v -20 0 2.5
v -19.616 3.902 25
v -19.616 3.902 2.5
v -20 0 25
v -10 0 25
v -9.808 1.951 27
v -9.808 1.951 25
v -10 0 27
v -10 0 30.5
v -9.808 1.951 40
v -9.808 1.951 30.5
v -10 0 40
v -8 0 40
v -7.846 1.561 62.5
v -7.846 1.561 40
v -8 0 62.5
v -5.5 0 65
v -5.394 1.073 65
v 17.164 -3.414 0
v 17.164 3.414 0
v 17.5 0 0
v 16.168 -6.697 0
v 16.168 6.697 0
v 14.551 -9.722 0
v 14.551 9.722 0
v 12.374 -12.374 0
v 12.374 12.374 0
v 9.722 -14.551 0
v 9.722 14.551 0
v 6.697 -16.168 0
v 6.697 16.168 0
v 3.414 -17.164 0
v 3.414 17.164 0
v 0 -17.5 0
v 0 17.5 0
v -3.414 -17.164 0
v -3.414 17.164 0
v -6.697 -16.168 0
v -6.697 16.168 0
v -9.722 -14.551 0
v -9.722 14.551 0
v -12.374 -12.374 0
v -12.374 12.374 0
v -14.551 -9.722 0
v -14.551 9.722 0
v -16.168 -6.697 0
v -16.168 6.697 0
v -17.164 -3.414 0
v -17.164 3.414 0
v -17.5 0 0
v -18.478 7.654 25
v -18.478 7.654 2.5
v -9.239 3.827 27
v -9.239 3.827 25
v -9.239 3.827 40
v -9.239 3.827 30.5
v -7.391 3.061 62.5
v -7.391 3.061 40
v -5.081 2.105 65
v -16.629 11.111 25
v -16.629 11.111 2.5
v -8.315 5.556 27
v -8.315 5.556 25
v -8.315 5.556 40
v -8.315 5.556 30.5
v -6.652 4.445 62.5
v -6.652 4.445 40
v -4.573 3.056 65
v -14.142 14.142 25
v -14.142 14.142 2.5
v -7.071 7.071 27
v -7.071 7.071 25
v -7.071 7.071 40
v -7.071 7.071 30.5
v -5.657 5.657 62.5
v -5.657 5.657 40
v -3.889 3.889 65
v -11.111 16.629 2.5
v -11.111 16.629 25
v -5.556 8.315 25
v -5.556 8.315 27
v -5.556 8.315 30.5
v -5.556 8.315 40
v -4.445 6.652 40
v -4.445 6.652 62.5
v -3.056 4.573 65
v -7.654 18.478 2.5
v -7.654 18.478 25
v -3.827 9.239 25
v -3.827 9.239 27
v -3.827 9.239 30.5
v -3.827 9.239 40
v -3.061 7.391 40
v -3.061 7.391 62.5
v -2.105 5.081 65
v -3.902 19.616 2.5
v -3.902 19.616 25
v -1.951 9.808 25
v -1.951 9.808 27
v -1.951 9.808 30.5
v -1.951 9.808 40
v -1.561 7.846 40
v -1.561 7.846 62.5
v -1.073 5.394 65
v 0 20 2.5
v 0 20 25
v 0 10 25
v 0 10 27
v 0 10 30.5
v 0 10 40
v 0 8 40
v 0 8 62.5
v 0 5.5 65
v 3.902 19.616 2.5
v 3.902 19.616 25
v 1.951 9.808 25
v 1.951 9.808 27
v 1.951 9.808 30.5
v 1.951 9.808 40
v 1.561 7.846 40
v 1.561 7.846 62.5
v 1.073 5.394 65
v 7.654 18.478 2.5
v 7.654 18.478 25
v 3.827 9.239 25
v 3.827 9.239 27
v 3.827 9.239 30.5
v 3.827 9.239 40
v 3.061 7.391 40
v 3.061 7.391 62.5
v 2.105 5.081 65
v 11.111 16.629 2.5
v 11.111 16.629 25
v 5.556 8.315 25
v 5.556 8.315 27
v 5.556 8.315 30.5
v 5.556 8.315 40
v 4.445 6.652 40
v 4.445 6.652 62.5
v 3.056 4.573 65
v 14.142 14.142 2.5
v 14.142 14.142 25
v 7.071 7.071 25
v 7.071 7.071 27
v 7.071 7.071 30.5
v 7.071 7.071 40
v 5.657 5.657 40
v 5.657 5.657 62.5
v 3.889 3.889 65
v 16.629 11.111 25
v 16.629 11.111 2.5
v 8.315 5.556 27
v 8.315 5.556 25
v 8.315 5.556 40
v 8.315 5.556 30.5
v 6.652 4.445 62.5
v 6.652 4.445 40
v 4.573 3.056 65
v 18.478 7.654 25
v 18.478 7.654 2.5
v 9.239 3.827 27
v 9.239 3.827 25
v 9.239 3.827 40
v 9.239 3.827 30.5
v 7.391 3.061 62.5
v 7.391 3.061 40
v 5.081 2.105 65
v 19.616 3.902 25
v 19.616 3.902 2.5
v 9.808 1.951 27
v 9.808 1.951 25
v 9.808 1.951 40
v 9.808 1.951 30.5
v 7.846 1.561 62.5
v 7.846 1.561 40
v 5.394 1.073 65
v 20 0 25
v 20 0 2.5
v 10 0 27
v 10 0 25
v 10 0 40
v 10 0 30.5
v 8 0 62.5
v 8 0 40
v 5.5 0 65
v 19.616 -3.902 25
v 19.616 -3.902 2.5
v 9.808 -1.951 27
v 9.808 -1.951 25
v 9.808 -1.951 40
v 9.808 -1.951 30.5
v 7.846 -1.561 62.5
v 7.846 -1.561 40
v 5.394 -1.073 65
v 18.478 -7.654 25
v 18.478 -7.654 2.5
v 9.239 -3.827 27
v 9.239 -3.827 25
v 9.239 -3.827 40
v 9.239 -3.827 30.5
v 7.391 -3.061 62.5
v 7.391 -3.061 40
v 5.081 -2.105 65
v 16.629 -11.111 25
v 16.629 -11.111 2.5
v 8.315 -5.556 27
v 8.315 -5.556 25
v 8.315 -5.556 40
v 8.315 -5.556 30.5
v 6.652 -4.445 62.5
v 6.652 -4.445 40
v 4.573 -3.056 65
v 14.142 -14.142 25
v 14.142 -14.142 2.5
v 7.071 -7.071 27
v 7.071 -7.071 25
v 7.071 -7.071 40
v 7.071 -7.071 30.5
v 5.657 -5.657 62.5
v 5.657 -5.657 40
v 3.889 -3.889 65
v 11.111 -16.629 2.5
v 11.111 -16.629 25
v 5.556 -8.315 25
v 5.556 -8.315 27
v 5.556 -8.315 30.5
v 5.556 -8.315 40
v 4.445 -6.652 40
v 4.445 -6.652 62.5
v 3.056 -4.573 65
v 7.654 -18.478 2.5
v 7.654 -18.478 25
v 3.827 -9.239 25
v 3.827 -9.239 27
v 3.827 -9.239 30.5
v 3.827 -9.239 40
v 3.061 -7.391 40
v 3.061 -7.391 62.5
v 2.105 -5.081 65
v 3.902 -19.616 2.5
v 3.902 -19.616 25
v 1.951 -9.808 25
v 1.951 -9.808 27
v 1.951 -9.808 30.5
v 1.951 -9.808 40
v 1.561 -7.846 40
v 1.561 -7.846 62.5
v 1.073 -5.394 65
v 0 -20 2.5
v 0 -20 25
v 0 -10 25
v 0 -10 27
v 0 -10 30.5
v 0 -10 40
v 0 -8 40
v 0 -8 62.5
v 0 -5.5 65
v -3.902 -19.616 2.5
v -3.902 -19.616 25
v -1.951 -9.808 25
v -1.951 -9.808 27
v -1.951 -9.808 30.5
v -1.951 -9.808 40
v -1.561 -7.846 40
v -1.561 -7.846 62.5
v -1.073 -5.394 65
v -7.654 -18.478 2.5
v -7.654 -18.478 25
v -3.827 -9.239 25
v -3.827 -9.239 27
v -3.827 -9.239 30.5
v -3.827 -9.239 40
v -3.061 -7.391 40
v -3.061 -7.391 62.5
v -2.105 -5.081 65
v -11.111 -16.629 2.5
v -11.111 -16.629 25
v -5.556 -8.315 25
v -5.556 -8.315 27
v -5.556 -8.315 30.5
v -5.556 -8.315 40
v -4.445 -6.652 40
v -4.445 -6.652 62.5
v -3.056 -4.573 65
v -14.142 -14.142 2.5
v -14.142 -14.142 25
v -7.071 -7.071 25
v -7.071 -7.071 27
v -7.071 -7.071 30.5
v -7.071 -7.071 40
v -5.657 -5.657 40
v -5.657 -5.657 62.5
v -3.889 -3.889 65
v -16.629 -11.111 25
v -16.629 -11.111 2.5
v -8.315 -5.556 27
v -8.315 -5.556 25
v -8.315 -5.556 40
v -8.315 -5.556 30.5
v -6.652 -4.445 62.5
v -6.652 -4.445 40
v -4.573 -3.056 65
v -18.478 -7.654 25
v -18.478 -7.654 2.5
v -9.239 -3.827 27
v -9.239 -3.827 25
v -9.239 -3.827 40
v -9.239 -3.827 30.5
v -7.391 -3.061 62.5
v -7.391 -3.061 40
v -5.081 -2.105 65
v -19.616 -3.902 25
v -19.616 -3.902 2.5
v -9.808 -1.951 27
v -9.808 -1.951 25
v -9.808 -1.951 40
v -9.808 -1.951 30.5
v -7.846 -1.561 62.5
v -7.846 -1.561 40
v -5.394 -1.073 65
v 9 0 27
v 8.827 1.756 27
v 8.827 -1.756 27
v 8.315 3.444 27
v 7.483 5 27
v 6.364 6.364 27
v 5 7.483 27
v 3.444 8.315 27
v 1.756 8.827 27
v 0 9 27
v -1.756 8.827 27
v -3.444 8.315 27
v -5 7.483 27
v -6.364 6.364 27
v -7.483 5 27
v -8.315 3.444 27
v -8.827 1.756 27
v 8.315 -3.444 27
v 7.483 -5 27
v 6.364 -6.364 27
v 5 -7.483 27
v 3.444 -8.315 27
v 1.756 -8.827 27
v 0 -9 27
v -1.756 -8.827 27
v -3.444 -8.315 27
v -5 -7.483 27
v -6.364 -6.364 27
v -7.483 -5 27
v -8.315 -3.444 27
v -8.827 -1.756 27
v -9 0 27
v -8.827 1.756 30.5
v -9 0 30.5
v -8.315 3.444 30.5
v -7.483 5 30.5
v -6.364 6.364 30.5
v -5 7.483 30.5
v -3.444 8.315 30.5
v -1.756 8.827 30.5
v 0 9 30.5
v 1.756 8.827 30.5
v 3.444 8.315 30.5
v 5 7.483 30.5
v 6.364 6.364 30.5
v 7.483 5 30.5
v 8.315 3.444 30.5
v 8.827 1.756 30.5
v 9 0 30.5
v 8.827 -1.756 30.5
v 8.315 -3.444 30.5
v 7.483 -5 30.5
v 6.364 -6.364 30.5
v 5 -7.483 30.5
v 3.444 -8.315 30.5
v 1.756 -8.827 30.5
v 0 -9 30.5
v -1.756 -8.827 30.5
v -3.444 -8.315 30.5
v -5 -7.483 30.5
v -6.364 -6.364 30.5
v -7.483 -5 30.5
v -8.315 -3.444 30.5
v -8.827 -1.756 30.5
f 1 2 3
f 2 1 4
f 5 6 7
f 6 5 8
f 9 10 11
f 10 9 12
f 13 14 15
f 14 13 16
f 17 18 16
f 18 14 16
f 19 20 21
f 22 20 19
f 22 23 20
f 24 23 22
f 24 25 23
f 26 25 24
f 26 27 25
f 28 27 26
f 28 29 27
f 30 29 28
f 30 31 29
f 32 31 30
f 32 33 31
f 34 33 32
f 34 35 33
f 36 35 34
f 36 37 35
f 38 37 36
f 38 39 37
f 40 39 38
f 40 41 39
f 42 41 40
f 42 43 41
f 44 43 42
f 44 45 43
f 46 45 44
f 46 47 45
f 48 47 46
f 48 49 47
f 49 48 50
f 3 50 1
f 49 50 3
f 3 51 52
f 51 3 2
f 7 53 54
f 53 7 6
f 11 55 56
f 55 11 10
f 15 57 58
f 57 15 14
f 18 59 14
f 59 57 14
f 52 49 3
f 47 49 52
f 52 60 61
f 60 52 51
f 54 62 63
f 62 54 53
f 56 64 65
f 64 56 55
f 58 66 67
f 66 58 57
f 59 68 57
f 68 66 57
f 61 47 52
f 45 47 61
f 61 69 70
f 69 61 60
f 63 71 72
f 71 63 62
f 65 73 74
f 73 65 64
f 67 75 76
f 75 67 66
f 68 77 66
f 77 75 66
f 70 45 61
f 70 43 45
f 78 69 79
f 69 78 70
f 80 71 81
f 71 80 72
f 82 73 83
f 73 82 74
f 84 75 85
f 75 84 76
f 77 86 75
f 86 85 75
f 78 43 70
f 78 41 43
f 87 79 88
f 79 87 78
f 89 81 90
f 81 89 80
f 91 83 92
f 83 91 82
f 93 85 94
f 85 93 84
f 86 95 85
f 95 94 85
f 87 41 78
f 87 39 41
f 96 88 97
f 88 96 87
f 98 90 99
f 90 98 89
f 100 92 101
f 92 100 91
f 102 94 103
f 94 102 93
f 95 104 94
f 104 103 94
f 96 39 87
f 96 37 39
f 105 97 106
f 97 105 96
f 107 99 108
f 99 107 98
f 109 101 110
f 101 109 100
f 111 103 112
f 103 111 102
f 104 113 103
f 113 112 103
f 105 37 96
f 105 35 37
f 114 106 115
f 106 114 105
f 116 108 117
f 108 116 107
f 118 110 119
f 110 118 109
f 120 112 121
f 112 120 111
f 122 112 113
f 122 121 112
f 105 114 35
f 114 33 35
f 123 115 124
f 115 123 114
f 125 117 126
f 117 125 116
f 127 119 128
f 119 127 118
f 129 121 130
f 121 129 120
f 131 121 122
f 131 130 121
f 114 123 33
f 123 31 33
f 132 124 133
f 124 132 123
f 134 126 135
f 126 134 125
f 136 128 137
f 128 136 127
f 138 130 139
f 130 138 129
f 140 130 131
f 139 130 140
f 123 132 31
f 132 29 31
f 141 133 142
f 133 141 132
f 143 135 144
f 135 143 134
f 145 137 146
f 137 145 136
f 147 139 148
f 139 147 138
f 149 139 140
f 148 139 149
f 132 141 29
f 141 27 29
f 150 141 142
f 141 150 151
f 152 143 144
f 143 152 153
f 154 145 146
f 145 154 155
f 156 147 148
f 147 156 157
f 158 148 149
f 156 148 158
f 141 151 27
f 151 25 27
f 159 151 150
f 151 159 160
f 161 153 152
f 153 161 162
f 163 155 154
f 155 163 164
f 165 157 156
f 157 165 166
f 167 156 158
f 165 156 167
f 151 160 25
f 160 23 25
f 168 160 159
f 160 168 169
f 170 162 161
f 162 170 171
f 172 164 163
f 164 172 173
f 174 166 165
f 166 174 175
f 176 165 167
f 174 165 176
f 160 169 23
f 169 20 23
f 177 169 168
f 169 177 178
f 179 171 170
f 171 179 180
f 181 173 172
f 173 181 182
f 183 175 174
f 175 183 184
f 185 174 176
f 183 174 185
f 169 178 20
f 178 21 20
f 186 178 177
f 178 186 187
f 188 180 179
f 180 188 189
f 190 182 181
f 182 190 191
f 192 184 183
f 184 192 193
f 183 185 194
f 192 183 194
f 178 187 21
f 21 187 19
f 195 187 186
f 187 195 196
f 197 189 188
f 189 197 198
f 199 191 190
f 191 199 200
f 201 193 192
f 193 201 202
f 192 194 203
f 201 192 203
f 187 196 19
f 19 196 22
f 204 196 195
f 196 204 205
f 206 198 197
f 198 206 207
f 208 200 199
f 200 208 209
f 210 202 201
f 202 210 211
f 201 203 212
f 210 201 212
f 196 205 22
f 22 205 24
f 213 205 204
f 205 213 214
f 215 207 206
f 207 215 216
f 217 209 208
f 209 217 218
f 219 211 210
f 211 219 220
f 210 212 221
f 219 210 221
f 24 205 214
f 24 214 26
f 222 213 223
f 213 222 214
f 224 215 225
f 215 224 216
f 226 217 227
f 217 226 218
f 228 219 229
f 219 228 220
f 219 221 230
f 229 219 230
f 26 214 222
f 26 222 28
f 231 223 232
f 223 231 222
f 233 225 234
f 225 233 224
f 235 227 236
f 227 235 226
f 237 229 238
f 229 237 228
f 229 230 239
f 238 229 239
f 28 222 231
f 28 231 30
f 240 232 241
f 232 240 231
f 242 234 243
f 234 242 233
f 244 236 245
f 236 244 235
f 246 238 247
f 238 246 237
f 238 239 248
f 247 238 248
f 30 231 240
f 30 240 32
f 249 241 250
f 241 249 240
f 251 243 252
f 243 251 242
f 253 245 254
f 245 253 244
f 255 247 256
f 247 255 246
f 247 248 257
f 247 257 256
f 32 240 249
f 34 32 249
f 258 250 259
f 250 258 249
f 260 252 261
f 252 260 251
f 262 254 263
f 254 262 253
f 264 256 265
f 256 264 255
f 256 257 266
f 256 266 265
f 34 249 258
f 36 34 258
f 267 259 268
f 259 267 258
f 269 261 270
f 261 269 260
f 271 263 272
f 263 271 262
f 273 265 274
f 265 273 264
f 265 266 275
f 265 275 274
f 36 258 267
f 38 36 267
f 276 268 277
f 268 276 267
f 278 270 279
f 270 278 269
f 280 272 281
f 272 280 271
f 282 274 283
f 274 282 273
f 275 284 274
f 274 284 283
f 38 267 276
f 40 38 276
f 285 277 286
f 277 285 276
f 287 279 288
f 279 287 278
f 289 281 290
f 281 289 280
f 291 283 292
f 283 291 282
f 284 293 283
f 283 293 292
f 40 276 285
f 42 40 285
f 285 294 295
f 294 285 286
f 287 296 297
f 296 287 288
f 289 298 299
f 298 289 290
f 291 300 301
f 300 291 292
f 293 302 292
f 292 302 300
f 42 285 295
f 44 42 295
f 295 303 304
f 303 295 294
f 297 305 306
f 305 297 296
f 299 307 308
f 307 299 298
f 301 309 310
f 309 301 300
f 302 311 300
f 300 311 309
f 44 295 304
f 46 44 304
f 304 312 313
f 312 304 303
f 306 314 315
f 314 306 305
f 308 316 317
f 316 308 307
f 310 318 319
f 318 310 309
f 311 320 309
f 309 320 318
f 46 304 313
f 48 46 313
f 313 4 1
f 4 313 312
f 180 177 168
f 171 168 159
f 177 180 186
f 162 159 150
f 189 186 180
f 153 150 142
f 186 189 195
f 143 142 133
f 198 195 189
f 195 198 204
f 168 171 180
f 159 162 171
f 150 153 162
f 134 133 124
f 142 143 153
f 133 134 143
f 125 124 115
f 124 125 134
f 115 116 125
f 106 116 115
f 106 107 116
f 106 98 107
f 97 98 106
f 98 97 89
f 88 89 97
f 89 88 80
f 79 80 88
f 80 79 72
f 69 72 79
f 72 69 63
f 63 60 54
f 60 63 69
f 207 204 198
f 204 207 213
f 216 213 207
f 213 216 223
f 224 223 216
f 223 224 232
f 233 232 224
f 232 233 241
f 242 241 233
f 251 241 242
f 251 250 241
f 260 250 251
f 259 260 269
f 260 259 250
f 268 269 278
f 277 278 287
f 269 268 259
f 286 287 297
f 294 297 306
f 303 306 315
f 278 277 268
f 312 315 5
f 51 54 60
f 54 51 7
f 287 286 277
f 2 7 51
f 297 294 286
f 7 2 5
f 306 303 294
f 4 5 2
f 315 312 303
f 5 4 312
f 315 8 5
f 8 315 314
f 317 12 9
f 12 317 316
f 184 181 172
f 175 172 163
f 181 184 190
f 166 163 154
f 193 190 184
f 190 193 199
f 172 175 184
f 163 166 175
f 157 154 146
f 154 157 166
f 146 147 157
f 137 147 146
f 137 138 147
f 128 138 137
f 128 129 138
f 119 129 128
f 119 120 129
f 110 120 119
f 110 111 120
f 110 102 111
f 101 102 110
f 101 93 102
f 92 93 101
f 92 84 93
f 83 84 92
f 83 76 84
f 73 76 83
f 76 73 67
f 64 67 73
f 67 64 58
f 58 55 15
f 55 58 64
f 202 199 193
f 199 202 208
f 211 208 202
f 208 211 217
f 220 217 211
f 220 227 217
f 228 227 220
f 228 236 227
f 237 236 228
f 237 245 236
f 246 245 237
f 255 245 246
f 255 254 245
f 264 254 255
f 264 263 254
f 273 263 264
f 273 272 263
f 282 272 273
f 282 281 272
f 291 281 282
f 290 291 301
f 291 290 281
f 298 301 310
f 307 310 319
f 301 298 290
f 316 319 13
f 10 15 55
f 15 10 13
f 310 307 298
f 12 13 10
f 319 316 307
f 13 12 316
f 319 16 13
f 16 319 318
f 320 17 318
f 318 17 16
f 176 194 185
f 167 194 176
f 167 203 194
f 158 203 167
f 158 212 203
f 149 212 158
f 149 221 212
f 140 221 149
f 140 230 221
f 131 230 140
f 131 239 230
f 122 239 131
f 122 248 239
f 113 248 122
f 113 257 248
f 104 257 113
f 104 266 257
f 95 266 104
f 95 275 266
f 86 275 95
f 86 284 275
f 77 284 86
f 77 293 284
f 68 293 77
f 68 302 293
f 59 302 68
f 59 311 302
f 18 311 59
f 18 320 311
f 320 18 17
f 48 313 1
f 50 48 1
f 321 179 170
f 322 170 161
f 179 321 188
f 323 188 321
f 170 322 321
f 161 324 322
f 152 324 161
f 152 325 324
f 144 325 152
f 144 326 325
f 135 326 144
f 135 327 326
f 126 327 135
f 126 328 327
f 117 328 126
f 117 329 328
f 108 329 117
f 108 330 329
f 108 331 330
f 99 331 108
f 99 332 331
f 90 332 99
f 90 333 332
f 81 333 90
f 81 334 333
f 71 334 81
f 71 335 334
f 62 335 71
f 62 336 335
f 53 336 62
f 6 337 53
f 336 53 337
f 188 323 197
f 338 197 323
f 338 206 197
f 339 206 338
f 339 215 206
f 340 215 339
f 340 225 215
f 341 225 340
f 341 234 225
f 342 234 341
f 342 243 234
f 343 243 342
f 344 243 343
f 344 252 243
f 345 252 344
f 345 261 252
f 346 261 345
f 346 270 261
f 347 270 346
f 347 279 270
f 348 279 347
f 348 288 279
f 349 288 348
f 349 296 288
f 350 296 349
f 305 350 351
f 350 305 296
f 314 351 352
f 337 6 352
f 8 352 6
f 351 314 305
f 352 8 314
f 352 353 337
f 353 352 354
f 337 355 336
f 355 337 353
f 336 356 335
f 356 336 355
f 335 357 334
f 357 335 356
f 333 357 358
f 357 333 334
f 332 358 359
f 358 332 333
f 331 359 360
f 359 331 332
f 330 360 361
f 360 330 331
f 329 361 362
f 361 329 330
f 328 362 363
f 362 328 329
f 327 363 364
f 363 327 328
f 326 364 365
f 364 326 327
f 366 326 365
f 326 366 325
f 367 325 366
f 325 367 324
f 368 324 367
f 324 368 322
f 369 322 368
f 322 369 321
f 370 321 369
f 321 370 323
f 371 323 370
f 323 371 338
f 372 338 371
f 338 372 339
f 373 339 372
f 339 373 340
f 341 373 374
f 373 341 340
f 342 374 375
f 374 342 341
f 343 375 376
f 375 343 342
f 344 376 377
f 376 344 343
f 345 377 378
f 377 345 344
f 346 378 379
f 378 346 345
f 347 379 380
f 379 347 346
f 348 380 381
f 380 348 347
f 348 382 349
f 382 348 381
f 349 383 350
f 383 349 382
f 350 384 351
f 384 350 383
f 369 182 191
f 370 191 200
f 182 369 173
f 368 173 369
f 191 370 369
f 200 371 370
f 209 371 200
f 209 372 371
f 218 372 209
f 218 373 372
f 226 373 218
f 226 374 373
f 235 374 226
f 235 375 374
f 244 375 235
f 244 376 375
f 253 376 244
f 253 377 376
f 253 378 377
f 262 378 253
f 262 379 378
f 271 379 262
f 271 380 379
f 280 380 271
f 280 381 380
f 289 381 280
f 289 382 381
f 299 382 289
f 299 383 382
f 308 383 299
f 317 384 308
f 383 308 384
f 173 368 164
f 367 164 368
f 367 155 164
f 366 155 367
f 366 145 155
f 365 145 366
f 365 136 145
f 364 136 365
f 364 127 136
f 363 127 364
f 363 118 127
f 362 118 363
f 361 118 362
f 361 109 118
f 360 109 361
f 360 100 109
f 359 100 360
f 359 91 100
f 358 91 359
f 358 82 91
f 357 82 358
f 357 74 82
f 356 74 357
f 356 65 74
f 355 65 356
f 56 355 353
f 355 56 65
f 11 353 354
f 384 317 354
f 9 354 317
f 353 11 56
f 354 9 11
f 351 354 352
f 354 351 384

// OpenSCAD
$fn = 32;

// ----------------------------------------------------------------------
// Stepped shaft: diameters 40, 20, 16 mm, 65 mm long
// ----------------------------------------------------------------------

// --- parameters (mm) ---
d1 = 40;                  // step 1 diameter
len1 = 25;                // step 1 length
d2 = 20;                  // step 2 diameter
len2 = 15;                // step 2 length
d3 = 16;                  // step 3 diameter
len3 = 25;                // step 3 length
total = 65;               // overall length
chamfer = 2.5;            // end chamfer
groove_r = 10;            // groove radius
groove_z = 27;            // groove position from the end
groove_w = 3.5;           // groove width
groove_d = 1;             // groove depth

/* closed turning profile: x is the radius, y is the length */
profile = [[0, 0], [20 - chamfer, 0], [20, chamfer], [20, 25], [10, 25], [10, 40], [8, 40], [8, 62.5], [5.5, 65], [0, 65]];

difference() {
  rotate_extrude() polygon(profile);
  /* circlip groove just behind the shoulder */
  rotate_extrude() translate([groove_r - groove_d, groove_z]) square([groove_d + 1, groove_w]);
}
